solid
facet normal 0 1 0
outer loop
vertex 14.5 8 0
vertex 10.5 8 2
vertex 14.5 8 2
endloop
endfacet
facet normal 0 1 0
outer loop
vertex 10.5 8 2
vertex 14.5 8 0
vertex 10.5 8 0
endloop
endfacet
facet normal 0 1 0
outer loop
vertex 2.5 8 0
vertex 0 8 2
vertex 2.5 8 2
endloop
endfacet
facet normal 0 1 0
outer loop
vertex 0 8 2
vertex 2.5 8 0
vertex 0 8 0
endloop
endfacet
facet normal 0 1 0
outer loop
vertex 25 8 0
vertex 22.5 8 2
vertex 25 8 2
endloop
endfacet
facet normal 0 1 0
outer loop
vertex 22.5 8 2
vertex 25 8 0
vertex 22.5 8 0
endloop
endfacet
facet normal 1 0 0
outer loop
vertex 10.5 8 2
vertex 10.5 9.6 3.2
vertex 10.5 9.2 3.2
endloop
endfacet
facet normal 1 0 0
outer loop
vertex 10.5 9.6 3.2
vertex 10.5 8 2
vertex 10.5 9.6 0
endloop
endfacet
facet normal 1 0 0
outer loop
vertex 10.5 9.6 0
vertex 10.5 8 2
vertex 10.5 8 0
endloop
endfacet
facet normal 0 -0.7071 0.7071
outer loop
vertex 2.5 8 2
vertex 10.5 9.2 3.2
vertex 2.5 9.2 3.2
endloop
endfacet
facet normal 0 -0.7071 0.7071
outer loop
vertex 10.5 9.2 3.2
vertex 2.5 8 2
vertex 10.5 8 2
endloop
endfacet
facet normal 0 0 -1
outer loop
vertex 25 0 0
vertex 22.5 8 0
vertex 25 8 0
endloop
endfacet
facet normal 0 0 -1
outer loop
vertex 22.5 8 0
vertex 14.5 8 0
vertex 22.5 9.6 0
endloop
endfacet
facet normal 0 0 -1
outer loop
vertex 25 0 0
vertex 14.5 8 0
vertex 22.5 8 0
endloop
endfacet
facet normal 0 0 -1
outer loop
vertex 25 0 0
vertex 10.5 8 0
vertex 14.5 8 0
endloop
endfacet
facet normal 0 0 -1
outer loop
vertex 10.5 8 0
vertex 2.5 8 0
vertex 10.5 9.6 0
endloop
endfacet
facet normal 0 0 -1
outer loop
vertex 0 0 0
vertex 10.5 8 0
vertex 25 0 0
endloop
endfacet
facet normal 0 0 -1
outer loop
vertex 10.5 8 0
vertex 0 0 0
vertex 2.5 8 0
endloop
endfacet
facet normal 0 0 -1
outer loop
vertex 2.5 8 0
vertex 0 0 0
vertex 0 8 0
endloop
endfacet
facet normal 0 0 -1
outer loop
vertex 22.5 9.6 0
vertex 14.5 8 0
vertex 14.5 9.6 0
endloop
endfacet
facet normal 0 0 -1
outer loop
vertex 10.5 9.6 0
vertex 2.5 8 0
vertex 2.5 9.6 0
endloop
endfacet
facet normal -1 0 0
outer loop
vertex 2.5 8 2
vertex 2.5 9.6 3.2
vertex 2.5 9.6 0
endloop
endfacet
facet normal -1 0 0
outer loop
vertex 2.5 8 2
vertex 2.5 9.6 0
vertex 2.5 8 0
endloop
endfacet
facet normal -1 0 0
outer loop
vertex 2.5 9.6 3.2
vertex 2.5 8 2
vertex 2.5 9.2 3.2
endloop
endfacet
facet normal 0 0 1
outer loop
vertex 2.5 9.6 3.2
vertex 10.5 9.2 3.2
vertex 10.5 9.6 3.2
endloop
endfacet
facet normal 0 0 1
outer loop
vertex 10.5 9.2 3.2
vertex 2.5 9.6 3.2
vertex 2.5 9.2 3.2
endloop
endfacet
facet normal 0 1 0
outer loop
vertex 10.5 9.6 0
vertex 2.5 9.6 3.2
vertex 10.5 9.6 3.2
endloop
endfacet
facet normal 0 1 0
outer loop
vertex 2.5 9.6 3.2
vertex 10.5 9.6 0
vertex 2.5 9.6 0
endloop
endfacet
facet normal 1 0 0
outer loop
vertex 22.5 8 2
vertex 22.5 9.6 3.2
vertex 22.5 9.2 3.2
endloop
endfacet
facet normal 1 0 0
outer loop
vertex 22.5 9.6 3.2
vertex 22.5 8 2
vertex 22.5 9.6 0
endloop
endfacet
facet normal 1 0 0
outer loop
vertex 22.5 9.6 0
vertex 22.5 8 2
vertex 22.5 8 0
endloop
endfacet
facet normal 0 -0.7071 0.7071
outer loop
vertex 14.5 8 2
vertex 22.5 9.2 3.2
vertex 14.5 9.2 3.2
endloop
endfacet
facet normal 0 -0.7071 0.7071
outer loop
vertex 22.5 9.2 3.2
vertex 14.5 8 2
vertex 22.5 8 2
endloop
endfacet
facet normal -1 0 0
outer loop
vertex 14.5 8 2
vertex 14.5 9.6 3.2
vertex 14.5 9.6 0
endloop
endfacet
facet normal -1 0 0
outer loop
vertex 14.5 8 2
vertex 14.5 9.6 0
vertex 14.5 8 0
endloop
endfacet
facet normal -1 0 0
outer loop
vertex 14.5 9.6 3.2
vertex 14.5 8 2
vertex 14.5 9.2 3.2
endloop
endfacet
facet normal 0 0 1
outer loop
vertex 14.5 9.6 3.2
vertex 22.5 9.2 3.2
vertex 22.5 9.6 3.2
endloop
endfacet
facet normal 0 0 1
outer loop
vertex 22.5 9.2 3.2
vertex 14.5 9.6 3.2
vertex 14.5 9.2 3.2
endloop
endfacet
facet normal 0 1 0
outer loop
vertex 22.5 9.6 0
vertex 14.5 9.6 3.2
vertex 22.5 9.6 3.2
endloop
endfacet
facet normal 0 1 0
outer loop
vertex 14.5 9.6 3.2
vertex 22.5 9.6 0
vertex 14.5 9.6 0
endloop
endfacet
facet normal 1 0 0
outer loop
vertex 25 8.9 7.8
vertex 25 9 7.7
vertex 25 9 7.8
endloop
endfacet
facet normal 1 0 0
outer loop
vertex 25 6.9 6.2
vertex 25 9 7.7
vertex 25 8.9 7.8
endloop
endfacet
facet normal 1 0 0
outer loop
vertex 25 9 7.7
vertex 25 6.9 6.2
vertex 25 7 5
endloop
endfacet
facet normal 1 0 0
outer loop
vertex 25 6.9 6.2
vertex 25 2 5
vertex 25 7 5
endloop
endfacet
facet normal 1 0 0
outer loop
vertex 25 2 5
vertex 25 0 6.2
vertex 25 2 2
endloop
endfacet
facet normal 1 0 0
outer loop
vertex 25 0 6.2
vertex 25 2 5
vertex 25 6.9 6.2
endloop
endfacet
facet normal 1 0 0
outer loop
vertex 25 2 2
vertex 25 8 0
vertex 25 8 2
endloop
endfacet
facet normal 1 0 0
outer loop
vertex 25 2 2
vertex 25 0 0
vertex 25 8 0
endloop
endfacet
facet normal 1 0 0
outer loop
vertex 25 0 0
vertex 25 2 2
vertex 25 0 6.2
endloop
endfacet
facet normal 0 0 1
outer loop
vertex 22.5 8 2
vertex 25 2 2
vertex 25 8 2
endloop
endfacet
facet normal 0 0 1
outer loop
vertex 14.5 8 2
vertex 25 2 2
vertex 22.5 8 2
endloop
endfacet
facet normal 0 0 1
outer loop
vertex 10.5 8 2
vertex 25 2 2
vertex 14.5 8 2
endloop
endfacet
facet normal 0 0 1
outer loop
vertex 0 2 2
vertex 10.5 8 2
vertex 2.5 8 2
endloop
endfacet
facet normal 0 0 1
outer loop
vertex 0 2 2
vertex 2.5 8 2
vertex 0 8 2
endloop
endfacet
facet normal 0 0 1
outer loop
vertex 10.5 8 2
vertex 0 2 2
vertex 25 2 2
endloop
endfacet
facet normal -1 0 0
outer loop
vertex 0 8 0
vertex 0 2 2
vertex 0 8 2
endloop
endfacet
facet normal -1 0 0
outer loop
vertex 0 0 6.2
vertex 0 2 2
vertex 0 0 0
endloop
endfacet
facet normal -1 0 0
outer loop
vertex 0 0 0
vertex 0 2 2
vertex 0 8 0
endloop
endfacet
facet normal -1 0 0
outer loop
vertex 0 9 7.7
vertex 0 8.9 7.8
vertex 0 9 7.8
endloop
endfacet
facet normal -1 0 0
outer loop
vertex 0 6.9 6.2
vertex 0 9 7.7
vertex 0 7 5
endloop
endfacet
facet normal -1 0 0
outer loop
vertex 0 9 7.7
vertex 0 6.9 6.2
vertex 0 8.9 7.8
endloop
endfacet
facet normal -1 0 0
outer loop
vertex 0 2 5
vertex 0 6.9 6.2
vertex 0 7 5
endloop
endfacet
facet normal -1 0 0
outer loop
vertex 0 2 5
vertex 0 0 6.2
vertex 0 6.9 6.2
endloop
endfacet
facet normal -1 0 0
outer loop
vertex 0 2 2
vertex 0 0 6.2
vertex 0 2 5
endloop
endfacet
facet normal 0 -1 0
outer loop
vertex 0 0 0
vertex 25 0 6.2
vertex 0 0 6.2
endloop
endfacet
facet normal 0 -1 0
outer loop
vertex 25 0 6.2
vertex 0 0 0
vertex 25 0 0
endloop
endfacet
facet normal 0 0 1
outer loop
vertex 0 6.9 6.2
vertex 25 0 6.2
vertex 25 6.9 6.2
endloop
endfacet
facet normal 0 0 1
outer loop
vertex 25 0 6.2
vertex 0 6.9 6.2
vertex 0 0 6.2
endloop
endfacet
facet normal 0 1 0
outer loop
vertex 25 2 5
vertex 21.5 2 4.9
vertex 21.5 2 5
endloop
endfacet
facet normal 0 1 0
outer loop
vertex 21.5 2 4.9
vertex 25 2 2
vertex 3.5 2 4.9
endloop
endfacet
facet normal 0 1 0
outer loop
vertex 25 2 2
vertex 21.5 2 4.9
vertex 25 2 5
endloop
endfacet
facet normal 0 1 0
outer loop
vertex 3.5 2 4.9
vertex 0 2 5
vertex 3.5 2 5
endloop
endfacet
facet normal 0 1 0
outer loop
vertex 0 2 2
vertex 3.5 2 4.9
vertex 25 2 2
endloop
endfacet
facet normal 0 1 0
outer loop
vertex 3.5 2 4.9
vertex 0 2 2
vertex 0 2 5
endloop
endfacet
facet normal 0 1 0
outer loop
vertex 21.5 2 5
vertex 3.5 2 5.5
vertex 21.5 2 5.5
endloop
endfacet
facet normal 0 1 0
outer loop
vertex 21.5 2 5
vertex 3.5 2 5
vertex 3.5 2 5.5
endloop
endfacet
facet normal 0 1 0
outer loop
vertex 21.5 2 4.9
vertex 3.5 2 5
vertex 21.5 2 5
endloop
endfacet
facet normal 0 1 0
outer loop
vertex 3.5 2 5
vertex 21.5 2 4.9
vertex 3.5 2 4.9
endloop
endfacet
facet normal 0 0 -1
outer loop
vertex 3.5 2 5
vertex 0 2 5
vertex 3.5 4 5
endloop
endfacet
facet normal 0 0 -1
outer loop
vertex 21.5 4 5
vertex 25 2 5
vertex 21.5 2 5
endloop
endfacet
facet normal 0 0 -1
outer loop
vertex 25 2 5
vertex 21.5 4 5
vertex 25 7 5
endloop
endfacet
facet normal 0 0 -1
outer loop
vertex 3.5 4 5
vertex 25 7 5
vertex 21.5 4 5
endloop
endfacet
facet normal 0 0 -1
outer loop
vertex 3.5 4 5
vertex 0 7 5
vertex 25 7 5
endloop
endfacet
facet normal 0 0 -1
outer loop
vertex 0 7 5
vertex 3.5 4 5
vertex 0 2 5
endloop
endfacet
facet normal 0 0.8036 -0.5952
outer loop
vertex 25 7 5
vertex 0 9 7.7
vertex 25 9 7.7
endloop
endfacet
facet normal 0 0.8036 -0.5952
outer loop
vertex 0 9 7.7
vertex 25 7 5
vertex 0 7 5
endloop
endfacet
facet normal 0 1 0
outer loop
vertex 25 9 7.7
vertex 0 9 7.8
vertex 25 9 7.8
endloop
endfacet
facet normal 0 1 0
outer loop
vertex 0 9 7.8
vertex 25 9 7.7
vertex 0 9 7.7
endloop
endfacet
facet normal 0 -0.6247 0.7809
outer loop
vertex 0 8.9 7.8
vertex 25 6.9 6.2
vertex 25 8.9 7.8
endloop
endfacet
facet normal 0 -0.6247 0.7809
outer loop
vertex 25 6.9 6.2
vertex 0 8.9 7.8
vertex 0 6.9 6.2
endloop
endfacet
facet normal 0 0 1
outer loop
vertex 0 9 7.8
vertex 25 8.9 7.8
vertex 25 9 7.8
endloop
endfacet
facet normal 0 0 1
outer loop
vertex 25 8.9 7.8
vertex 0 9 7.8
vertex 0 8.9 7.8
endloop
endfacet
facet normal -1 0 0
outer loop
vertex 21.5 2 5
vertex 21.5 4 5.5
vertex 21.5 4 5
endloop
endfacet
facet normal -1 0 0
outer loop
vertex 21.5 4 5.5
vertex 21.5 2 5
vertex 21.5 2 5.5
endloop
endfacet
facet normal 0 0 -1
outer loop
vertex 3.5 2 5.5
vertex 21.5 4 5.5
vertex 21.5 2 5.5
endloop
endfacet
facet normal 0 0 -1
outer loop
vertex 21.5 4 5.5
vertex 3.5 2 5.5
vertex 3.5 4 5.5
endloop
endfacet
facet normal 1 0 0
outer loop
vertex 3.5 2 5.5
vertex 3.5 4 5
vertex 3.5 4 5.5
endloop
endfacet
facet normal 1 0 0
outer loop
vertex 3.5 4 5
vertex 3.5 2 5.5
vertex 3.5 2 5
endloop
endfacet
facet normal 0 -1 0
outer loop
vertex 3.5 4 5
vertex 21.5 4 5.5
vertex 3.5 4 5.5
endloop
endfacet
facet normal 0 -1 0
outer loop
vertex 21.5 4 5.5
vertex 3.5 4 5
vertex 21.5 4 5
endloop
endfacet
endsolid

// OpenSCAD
// ============================================================
// CLIP DE RETENÇÃO PARA FILTRO HEPA
// Impressão 3D - PLA/PETG (Ender 3)
// ============================================================
//
// CONCEITO: Clips que seguram o filtro HEPA pela borda (rim)
// contra o MDF da divisória. A borda do filtro repousa sobre
// o MDF ao redor do furo 100×130mm, e os clips prendem por cima.
//
// FILTRO HEPA:
//   Externo: ~110×140mm
//   Borda (rim): 5mm de largura, 2mm de espessura
//   Corpo: 25mm de profundidade (passa pelo furo)
//   Furo MDF: 100×130mm (borda de 5mm repousa no MDF)
//
// FIXAÇÃO: 2 dentes snap-fit por clip, passam por slots
// cortados no MDF a 8mm da borda do furo.
//
// QUANTIDADE: 8 clips (2 por lado do furo)
//
// VISTA LATERAL (corte):
//
//   ┌── aba (sobre borda HEPA) ──┐
//   │    borda 5mm, 2mm esp      │
//   ╞═══MDF══[entalhe]═══════════╡  ← entalhe 25×2mm no MDF
//            │  base (sob o MDF)  │
//            └── dente ── dente ──┘
//
// MONTAGEM:
//   1. Incline o clip pela abertura do furo
//   2. Deslize a base por baixo do MDF (área sólida)
//   3. A parede passa pelo entalhe 25×2mm na borda
//   4. Dentes clicam nos slots do MDF
//   5. Aba retém a borda do filtro HEPA por cima
//
// ============================================================

// === PARÂMETROS ===
mdf = 3;              // Espessura MDF
folga = 0.3;          // Folga de encaixe

// HEPA
hepa_borda_esp = 2;   // Espessura da borda do filtro HEPA
hepa_borda_larg = 5;  // Largura da borda (rim)

// Clip
clip_larg = 25;       // Largura do clip ao longo da borda
clip_parede = 2;      // Espessura das paredes
aba_comp = 7;         // Comprimento da aba (5mm borda + 2mm garra)
aba_esp = 1.2;        // Espessura da aba (flexível)
base_prof = 8;        // Profundidade da base por baixo do MDF

// Snap-fit
dente_h = 1.2;        // Altura do dente
dente_w = 8;          // Largura do dente
dente_pos1 = 6;       // Posição dente 1 (do centro do clip)
dente_pos2 = 6;       // Simétrico

// Slot no MDF (cortado CNC)
slot_w = 10;          // Largura do slot (dente_w + 2mm folga)
slot_h = 2;           // Altura do slot (dente_h + folga)
// 2 slots por clip × 8 clips = 16 slots

// Entalhe no MDF para parede do clip (CNC)
entalhe_w    = clip_larg;   // 25mm (largura do clip)
entalhe_prof = clip_parede; // 2mm (espessura da parede)

// === MÓDULO PRINCIPAL ===
module clip_hepa() {
    // X = largura (25mm ao longo da borda)
    // Y = profundidade (base → aba, perpendicular ao furo)
    // Z = altura (de baixo do MDF para cima)
    //
    // Z=0 = face inferior do MDF
    // Z=mdf = face superior do MDF (onde borda HEPA repousa)
    // Z=mdf+hepa_borda_esp = topo da borda HEPA

    difference() {
        union() {
            // --- BASE (por baixo do MDF) ---
            cube([clip_larg, base_prof, clip_parede]);

            // --- PAREDE VERTICAL (borda do furo) ---
            // Sobe pela borda, abraçando o MDF
            cube([clip_larg, clip_parede, mdf + hepa_borda_esp + aba_esp]);

            // --- ABA DE RETENÇÃO (sobre borda HEPA) ---
            // Mais curta que a do manta: apenas 7mm para cobrir
            // os 5mm de borda + 2mm de garra
            translate([0, 0, mdf + hepa_borda_esp])
                cube([clip_larg, aba_comp, aba_esp]);

            // --- RAMPA DE ENTRADA ---
            // Chanfro na ponta para facilitar encaixe do filtro
            translate([0, aba_comp - 0.1, mdf + hepa_borda_esp])
            hull() {
                cube([clip_larg, 0.1, aba_esp]);
                translate([0, 2, aba_esp + 1.5])
                    cube([clip_larg, 0.1, 0.1]);
            }

            // --- DENTES SNAP-FIT (2 por clip) ---
            translate([clip_larg/2 - dente_pos1 - dente_w/2, base_prof, 0])
                dente_snap();
            translate([clip_larg/2 + dente_pos2 - dente_w/2, base_prof, 0])
                dente_snap();
        }

        // --- CANAL de flexão na aba ---
        // Permite que a aba flexione ao inserir/remover filtro
        translate([clip_parede + 1.5, clip_parede, mdf + hepa_borda_esp - 0.1])
            cube([clip_larg - 2*clip_parede - 3, aba_comp - clip_parede - 3, 0.6]);
    }
}

// Dente snap-fit (idêntico ao CLIP_MANTA_G3)
module dente_snap() {
    hull() {
        cube([dente_w, 0.1, clip_parede]);
        translate([0, dente_h, 0])
            cube([dente_w, 0.1, clip_parede + dente_h]);
    }
    translate([0, dente_h, 0])
        cube([dente_w, 0.4, clip_parede + dente_h]);
}

// === VISUALIZAÇÃO ===

// Clip orientado para impressão (base na mesa)
clip_hepa();

// MDF fantasma para referência
%translate([-5, -2, 0])
    cube([clip_larg + 10, base_prof + aba_comp + 10, mdf]);

// Borda do HEPA fantasma
%translate([0, 0, mdf])
    color("DodgerBlue", 0.4)
        cube([clip_larg, hepa_borda_larg, hepa_borda_esp]);
